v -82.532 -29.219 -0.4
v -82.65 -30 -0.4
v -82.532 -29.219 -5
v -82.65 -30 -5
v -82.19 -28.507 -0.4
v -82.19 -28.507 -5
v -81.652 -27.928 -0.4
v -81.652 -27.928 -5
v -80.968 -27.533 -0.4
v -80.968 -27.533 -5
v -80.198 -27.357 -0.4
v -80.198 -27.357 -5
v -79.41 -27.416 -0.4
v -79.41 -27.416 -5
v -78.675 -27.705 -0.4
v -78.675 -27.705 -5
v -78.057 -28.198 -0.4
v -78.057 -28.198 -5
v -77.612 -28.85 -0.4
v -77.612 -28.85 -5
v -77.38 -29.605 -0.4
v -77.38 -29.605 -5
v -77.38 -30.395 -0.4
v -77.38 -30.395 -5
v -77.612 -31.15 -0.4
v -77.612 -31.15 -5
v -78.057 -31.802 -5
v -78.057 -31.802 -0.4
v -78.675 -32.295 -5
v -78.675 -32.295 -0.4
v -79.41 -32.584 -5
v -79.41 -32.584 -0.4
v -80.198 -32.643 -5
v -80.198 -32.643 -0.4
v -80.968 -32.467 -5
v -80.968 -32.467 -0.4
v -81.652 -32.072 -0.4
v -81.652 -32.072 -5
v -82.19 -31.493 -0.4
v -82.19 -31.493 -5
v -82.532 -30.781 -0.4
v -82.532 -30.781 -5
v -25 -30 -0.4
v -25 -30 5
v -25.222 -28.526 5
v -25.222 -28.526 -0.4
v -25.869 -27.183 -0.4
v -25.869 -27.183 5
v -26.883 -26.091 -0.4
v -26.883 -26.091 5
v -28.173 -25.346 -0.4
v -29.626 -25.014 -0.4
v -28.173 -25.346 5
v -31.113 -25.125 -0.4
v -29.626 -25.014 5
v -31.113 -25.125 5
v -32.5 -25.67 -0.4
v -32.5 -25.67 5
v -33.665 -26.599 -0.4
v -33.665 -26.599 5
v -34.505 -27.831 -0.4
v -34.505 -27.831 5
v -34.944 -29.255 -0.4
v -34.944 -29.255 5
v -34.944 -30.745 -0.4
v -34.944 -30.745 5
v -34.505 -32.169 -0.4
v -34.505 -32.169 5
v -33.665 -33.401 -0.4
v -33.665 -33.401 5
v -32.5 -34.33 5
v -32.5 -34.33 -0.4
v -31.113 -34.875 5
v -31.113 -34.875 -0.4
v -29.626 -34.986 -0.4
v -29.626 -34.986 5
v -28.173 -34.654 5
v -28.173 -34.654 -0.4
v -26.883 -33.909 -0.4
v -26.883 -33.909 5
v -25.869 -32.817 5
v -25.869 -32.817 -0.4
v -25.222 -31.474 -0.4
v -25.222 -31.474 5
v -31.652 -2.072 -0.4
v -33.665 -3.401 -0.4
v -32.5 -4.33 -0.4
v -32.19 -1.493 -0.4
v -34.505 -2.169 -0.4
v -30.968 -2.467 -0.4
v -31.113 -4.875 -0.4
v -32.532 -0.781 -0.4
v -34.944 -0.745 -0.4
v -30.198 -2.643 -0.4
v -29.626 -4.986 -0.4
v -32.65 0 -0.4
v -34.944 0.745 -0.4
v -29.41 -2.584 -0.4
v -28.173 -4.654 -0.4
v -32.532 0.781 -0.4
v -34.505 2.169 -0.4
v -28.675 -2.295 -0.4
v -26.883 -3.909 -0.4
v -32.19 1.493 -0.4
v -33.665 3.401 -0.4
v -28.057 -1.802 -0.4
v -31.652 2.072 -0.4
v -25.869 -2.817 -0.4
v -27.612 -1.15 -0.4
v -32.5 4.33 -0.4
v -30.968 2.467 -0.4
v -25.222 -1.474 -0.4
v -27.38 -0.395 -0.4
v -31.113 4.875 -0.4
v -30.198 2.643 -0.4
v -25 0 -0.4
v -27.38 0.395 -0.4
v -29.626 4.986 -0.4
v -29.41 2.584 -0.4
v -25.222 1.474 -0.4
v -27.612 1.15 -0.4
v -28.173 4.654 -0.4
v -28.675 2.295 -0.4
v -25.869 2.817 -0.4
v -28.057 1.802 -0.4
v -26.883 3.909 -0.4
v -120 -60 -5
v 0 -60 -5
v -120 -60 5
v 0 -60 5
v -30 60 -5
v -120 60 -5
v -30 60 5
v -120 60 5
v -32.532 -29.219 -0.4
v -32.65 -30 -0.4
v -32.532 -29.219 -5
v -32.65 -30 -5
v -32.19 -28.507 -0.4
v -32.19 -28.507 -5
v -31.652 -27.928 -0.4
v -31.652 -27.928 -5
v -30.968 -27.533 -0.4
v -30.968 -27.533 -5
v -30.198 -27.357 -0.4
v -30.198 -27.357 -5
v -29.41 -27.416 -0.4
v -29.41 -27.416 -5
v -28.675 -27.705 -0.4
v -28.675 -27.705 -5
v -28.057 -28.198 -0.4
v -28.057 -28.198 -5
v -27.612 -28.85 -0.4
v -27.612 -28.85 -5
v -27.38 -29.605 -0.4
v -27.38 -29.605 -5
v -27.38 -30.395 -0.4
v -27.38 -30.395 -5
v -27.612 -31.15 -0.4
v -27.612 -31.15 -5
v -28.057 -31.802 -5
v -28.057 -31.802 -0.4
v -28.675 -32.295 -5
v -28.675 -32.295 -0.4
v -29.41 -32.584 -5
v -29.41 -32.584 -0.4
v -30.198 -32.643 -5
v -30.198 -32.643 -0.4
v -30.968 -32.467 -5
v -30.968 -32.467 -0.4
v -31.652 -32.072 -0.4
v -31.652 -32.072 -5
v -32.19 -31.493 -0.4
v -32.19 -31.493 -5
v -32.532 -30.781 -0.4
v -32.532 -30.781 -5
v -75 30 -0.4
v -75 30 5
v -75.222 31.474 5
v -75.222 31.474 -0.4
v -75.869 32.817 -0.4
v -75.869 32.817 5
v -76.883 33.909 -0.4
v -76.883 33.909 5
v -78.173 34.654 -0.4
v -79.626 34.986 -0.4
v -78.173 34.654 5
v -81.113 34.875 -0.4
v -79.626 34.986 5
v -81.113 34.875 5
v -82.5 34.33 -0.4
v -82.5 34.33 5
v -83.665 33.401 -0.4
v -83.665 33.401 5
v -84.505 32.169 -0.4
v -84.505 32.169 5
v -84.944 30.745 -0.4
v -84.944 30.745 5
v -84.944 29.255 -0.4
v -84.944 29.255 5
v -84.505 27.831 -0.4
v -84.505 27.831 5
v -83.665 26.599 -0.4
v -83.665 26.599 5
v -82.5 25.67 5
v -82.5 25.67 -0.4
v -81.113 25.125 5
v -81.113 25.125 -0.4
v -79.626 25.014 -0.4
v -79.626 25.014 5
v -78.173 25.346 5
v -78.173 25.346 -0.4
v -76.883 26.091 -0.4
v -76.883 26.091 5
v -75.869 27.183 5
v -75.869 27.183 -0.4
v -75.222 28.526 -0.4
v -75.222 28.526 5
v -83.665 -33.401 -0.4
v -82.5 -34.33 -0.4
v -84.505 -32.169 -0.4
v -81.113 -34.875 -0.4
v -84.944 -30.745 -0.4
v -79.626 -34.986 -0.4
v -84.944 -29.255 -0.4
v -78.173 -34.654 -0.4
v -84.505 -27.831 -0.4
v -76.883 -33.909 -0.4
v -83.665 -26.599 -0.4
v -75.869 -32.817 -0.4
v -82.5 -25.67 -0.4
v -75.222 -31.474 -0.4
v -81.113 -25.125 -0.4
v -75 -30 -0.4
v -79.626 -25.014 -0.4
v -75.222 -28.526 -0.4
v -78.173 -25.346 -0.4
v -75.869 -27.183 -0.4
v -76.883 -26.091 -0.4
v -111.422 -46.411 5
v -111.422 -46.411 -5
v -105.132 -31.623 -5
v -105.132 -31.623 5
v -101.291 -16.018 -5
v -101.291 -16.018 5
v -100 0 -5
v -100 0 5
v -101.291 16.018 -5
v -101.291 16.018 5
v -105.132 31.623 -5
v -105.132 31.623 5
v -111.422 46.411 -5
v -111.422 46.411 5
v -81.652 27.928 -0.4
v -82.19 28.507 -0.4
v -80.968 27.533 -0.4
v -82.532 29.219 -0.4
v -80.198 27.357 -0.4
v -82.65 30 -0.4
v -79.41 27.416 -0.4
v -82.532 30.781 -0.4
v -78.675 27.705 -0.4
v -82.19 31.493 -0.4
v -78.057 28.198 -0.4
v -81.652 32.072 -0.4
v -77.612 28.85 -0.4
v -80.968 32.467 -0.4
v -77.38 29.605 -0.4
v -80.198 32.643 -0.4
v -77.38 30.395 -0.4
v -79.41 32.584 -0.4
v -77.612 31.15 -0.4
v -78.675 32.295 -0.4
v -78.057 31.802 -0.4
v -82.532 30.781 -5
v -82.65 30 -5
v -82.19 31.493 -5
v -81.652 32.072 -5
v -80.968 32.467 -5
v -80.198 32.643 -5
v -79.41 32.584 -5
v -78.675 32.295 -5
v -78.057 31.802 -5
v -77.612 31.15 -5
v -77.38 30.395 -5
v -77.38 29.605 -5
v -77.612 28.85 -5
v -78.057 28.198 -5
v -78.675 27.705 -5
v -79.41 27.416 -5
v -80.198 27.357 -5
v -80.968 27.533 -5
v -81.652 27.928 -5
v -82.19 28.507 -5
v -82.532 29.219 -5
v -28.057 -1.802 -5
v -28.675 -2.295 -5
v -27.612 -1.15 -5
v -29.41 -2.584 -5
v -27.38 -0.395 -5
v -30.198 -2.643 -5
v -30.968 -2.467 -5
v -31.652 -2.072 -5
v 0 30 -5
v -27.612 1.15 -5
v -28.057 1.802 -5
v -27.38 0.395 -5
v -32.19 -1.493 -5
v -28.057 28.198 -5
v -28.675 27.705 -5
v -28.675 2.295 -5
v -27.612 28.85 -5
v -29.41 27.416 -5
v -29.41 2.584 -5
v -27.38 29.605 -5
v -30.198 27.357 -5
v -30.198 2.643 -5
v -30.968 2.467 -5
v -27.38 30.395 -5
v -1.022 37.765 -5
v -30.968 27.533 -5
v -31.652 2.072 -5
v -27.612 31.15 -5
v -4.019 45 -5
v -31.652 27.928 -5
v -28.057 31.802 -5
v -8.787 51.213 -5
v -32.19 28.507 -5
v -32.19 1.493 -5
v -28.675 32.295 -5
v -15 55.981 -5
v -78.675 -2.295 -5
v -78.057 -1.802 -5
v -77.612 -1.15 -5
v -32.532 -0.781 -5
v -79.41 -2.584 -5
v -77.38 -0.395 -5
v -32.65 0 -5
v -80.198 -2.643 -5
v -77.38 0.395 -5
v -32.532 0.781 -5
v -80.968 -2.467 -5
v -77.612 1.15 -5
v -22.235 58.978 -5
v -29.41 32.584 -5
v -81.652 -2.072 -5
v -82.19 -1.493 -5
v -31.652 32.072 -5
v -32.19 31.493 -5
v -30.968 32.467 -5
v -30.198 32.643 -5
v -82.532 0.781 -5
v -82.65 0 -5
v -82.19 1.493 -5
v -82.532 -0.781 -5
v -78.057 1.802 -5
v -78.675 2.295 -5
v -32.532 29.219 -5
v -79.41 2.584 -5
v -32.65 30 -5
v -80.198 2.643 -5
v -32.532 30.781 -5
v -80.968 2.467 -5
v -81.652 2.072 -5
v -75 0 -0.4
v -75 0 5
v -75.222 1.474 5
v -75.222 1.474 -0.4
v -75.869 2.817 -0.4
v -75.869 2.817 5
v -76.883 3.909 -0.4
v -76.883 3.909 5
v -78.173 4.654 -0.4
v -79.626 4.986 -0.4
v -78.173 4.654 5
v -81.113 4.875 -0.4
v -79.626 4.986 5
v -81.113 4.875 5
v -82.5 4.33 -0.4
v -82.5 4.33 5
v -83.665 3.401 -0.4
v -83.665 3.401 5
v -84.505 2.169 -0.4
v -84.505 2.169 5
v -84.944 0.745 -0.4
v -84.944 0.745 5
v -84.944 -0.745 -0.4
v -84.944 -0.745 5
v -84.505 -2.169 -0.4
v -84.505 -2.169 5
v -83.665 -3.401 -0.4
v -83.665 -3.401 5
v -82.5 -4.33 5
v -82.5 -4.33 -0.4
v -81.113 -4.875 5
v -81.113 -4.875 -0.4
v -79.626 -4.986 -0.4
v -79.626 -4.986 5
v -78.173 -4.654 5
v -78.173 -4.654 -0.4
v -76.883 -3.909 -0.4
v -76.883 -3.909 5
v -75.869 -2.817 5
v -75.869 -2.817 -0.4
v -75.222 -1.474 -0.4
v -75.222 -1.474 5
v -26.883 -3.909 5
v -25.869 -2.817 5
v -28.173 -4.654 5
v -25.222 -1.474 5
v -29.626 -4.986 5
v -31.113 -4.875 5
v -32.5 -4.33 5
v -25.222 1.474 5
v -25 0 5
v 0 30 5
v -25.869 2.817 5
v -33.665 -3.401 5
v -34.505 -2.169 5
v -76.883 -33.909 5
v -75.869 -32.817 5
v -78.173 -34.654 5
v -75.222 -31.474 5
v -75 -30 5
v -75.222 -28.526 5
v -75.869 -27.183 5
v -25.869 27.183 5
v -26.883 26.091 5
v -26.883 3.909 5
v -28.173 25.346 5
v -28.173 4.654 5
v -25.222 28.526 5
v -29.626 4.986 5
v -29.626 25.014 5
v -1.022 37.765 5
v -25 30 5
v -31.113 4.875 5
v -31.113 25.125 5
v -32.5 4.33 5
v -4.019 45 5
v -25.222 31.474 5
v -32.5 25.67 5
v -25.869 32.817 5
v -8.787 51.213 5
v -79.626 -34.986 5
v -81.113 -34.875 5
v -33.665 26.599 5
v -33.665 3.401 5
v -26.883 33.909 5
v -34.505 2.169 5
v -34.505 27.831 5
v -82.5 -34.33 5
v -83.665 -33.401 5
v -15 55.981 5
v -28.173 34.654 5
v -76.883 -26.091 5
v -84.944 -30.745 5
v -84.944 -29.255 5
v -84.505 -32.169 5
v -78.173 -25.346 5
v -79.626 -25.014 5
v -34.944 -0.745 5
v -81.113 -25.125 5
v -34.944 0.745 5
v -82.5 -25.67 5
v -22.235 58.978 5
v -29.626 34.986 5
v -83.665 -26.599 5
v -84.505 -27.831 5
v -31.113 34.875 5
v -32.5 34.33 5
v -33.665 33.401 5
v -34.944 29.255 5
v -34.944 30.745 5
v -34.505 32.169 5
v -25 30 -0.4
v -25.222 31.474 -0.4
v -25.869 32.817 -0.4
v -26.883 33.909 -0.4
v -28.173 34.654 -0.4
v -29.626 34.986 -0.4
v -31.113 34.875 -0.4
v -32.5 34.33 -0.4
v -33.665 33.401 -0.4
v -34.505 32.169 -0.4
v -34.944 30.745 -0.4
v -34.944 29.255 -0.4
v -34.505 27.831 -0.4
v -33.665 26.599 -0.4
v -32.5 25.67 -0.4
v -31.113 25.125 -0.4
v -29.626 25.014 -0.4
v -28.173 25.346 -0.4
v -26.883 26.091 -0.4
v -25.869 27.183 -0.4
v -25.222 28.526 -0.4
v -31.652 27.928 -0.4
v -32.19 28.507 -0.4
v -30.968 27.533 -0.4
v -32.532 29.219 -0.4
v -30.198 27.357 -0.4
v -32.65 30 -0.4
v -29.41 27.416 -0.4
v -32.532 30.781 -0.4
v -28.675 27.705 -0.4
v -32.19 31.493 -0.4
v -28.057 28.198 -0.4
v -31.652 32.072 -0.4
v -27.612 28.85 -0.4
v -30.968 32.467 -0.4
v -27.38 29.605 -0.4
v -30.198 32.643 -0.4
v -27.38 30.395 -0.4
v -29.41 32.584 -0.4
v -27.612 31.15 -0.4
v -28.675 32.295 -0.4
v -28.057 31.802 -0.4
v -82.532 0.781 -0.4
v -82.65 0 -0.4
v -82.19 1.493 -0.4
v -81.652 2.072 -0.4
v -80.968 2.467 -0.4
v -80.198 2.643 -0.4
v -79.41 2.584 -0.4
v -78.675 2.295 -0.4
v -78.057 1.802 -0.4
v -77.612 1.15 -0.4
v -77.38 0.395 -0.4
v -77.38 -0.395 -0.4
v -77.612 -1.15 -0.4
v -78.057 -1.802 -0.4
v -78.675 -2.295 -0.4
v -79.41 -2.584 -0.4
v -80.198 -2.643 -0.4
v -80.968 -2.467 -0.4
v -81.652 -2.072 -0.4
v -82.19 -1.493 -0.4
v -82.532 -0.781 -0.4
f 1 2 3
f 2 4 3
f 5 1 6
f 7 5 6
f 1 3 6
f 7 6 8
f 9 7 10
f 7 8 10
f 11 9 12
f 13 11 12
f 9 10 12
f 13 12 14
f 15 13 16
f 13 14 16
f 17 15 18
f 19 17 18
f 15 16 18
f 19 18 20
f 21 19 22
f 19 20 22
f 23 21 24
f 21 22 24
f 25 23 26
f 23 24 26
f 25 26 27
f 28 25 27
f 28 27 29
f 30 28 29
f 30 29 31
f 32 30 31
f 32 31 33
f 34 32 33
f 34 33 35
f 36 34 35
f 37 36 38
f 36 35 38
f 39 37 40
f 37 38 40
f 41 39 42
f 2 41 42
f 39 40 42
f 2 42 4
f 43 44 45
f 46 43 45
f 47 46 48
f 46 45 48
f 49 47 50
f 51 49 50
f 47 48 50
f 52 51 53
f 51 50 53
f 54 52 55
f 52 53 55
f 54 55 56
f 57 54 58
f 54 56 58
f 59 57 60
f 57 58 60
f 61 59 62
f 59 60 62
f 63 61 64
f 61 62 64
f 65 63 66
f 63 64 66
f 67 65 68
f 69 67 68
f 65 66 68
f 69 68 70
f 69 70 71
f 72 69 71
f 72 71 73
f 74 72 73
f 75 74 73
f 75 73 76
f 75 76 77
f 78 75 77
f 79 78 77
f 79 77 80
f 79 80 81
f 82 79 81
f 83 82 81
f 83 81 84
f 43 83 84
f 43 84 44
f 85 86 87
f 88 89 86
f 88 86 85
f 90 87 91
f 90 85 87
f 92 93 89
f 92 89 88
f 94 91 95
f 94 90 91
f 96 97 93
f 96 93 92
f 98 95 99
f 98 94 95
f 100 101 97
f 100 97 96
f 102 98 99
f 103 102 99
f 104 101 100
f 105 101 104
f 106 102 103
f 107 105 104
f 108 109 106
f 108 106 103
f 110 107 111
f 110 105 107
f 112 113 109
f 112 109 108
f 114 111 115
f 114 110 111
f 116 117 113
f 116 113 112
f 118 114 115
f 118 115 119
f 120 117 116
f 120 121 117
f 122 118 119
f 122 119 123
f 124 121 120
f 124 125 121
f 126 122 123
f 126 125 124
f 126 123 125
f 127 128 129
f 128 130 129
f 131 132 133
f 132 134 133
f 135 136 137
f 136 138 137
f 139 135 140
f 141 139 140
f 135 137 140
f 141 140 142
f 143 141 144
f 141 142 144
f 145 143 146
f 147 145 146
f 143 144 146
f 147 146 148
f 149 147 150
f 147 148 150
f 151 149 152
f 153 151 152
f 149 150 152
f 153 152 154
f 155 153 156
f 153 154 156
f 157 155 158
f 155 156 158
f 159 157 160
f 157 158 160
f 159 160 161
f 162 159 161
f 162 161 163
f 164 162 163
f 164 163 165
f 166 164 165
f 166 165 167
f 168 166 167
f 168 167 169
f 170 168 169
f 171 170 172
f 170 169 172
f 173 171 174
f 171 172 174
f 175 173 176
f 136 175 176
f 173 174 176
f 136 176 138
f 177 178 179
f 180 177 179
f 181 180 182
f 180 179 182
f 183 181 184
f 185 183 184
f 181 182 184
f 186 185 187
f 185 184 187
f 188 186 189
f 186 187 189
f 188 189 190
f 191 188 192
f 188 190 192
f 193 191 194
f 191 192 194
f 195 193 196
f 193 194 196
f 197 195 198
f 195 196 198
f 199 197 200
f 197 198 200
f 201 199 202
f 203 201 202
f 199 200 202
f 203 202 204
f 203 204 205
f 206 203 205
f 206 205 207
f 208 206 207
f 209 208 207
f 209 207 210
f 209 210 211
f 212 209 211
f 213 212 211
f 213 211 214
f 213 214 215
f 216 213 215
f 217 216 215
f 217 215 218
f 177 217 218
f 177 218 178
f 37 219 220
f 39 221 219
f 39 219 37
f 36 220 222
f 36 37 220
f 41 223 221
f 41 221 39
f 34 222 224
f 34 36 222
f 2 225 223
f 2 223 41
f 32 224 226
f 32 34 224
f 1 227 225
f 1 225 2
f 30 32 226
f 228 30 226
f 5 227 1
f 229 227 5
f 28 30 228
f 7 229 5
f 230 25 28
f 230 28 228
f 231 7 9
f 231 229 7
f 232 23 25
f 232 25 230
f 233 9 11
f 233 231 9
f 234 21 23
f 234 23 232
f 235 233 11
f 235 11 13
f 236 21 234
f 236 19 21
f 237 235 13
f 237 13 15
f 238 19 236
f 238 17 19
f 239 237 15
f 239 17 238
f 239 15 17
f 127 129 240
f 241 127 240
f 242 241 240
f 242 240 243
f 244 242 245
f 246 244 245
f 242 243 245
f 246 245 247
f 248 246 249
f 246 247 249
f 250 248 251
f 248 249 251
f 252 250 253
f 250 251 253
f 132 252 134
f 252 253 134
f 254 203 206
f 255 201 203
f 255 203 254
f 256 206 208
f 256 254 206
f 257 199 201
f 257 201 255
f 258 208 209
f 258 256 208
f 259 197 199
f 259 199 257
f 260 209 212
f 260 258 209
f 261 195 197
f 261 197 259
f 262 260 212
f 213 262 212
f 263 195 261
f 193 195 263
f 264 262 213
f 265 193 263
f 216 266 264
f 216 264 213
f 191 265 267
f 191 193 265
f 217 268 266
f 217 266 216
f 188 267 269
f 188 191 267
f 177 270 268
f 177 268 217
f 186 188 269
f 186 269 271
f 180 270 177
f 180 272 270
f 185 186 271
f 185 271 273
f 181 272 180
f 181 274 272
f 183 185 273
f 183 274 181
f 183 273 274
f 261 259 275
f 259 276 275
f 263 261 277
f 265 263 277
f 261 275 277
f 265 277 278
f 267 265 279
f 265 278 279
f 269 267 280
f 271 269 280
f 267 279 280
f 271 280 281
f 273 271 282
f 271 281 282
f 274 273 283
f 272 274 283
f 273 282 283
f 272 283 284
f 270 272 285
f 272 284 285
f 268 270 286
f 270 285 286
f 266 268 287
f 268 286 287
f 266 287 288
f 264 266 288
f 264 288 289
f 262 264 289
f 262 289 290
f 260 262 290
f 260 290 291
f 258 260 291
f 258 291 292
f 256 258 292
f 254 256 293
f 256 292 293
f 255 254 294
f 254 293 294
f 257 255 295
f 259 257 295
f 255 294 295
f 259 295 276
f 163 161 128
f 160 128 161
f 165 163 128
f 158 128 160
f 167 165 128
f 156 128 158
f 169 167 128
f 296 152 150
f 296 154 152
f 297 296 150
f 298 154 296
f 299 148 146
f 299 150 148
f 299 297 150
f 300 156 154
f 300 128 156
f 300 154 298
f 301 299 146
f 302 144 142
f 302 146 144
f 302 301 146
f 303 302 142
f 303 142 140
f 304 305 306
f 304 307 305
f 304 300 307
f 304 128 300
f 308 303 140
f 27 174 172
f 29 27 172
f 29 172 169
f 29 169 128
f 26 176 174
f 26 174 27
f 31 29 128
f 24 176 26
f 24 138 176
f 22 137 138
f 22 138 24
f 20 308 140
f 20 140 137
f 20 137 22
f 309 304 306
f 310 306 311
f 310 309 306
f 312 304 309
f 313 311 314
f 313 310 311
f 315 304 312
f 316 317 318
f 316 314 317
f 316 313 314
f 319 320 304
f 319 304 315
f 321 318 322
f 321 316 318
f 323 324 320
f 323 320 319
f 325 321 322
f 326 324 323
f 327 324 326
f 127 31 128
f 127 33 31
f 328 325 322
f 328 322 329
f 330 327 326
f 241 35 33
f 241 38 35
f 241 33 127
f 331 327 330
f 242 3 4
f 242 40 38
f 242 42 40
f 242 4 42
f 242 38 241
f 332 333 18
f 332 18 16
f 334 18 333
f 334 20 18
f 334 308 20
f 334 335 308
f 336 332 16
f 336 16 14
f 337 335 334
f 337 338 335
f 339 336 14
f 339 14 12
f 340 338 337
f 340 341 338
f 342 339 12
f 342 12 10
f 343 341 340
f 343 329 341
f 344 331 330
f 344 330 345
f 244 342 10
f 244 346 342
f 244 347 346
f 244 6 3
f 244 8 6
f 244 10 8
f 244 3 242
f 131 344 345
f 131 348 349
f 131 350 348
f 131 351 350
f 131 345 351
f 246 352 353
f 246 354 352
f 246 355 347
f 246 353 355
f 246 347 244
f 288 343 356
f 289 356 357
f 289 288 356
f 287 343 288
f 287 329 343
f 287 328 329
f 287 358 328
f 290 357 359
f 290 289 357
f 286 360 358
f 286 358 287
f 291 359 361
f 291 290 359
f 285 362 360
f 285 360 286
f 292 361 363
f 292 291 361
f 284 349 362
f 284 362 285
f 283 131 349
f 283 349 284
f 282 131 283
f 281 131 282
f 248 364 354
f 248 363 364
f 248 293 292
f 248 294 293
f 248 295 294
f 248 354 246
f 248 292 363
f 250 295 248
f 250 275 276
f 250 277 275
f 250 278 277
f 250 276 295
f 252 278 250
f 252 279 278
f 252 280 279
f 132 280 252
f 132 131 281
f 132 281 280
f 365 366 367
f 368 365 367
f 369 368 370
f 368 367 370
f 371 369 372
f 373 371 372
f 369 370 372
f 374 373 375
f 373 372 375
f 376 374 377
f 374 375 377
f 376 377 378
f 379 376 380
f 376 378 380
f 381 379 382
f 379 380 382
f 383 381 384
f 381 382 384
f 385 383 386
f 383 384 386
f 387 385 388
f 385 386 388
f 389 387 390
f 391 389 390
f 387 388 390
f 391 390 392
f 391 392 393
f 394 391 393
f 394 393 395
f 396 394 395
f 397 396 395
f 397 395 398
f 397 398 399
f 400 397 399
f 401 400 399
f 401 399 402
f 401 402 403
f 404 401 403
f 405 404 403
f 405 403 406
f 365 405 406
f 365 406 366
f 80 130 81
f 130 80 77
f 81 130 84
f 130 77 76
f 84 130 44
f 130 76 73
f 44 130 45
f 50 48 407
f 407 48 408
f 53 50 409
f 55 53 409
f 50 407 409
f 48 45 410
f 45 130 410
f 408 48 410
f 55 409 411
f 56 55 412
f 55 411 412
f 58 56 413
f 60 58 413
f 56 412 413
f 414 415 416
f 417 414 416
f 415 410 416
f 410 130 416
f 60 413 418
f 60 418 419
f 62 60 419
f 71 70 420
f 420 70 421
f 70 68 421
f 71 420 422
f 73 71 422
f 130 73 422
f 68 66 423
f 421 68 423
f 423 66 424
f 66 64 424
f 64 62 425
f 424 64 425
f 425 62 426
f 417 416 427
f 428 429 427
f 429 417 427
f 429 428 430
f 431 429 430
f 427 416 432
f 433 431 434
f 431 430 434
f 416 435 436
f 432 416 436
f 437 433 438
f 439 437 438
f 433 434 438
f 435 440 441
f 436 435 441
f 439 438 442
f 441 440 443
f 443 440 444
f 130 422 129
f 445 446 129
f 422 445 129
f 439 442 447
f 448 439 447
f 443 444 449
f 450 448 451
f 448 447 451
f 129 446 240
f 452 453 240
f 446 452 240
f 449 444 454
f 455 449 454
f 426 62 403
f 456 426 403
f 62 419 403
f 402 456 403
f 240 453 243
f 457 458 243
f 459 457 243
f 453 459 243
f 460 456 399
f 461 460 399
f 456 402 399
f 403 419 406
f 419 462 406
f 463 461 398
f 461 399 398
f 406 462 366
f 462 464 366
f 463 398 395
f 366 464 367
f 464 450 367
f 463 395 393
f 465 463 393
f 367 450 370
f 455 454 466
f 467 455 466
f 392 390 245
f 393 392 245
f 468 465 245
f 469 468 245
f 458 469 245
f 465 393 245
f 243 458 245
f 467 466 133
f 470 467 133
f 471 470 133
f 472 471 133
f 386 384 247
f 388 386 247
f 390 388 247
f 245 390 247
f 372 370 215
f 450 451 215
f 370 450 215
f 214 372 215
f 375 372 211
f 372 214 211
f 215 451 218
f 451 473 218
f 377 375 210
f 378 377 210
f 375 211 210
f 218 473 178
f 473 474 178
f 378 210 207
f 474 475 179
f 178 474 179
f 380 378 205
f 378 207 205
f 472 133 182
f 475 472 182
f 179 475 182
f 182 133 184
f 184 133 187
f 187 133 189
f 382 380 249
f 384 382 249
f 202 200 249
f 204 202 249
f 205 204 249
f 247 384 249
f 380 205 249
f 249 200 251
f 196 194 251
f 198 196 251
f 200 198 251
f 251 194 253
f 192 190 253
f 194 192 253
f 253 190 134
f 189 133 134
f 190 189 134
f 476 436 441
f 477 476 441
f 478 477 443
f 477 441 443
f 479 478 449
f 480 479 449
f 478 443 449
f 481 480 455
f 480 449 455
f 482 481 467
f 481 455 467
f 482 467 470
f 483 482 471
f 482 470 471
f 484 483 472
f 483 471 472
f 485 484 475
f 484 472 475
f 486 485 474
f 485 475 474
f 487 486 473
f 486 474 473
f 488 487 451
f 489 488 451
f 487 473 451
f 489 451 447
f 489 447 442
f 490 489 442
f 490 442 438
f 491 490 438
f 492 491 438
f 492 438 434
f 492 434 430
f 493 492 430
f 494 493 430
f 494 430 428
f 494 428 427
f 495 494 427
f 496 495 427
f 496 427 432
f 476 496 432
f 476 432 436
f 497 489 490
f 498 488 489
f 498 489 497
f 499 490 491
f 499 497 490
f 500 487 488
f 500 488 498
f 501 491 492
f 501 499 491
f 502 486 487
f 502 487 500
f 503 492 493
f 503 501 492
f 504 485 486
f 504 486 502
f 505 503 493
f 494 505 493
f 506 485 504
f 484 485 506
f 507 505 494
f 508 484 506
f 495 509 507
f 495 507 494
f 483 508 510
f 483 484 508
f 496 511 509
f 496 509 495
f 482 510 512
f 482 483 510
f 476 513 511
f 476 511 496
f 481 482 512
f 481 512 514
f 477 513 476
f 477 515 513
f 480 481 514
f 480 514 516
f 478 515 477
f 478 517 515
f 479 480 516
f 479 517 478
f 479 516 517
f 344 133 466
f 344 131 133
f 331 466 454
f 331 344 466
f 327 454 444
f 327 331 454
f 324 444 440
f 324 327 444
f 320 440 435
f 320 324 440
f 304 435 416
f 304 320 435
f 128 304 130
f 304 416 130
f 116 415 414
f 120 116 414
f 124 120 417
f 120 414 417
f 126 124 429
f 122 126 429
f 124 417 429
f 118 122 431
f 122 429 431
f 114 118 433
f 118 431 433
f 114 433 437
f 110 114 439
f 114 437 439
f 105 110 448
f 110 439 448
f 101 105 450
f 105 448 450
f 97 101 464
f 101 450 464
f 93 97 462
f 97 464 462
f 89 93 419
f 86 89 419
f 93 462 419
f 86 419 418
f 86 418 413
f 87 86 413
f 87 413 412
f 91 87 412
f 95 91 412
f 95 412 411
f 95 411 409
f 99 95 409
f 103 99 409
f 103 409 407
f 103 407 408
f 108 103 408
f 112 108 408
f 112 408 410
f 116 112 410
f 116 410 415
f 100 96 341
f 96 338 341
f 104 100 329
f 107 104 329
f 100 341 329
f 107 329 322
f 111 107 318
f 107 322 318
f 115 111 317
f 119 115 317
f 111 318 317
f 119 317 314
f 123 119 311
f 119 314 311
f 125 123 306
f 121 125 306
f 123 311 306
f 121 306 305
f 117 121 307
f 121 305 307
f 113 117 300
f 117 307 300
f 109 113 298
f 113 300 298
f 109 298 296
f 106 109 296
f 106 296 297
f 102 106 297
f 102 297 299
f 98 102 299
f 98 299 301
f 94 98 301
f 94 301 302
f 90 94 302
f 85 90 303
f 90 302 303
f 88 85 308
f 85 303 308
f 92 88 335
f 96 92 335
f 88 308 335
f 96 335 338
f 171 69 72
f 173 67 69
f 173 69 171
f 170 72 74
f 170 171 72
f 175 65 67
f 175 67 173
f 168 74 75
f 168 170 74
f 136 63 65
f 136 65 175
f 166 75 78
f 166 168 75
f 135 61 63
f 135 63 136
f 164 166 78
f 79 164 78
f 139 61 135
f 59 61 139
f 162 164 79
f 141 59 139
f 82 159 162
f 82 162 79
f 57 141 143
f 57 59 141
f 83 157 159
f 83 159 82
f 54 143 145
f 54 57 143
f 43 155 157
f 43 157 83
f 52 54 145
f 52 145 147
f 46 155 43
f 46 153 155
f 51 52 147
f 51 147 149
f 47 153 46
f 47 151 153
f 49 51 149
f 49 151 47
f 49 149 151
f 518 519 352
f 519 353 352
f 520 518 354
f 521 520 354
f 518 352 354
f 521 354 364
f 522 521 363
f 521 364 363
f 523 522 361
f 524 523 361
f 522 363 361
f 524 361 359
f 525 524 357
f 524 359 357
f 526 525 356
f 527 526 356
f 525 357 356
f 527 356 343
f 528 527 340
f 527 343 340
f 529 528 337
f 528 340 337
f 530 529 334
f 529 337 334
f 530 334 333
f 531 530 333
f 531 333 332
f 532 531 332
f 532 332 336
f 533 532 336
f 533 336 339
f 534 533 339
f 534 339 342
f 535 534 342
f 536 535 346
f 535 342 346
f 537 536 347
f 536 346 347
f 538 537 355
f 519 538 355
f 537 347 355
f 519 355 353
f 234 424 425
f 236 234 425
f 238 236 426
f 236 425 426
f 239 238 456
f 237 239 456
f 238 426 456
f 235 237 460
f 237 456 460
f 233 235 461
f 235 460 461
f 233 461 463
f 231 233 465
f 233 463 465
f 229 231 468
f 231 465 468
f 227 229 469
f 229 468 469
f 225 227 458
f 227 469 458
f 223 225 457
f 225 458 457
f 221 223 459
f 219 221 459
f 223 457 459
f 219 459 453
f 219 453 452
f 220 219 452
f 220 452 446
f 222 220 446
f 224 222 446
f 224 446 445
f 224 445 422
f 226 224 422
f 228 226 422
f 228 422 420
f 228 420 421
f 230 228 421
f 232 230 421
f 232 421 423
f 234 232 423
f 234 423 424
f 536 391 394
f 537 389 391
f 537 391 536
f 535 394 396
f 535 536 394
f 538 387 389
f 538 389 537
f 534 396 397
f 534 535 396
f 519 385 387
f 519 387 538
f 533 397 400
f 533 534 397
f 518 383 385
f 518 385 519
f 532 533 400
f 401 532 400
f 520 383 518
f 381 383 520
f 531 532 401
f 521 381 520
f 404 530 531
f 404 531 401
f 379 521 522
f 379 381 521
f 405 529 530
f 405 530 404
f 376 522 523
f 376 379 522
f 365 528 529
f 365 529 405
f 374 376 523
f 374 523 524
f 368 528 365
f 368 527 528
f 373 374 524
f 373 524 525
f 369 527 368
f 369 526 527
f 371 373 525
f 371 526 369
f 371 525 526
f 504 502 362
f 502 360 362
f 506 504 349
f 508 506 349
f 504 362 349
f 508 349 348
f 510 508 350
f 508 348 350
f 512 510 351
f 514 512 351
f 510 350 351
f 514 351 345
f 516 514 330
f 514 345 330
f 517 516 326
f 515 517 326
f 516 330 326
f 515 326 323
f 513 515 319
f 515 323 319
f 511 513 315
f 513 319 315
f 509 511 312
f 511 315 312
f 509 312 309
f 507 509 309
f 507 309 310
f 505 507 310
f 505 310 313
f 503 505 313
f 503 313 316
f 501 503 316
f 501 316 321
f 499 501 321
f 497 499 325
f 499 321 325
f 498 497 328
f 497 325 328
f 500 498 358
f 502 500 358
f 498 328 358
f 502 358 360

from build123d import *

# Parameters (mm, degrees)
AUFSATZ_LINEAR_AUSTRAGEN1_DEPTH                      = 5
VERRUNDUNG1_R                                        = 30
STIRNSENKUNG_F_R_M5_ZYLINDERSCHRAUBE_MIT_D           = 5.3
STIRNSENKUNG_F_R_M5_ZYLINDERSCHRAUBE_MIT_CBORE_D     = 10
STIRNSENKUNG_F_R_M5_ZYLINDERSCHRAUBE_MIT_CBORE_DEPTH = 5.4
LINEARES_MUSTER1_COUNT                               = 3
LINEARES_MUSTER1_PITCH                               = 30
LINEARES_MUSTER1_COUNT_DIR2                          = 2
LINEARES_MUSTER1_PITCH_DIR2                          = 50


with BuildPart() as part:
    # Skizze1 → Aufsatz-Linear austragen1 (new body, symmetric)
    with BuildSketch(Plane.XY):
        with BuildLine():
            Line((-120, 60), (0, 60))
            Line((0, 60), (0, -60))
            Line((0, -60), (-120, -60))
            ThreePointArc((-120, -60), (-100, 0), (-120, 60))
        make_face()
    extrude(amount=AUFSATZ_LINEAR_AUSTRAGEN1_DEPTH, both=True)

    # Verrundung1
    verrundung1_edges = [part.edges().sort_by_distance(p)[0] for p in [
        (0, 60, 0),
    ]]
    fillet(verrundung1_edges, radius=VERRUNDUNG1_R)

    # Stirnsenkung für M5 Zylinderschraube mit Innensechskant1 (through all)
    with Locations(Plane.XY.offset(5)):
        with Locations((-30, 30)):
            stirnsenkung_f_r_m5_zylinderschraube_mit = CounterBoreHole(STIRNSENKUNG_F_R_M5_ZYLINDERSCHRAUBE_MIT_D / 2, STIRNSENKUNG_F_R_M5_ZYLINDERSCHRAUBE_MIT_CBORE_D / 2, STIRNSENKUNG_F_R_M5_ZYLINDERSCHRAUBE_MIT_CBORE_DEPTH)

    # Lineares Muster1: Stirnsenkung f_r M5 Zylinderschraube mit 3 × 2
    with Locations(*[(-j * LINEARES_MUSTER1_PITCH_DIR2, -i * LINEARES_MUSTER1_PITCH, 0) for i in range(LINEARES_MUSTER1_COUNT) for j in range(LINEARES_MUSTER1_COUNT_DIR2) if (i, j) != (0, 0)]):
        add(stirnsenkung_f_r_m5_zylinderschraube_mit, mode=Mode.SUBTRACT)


solid = part.part
